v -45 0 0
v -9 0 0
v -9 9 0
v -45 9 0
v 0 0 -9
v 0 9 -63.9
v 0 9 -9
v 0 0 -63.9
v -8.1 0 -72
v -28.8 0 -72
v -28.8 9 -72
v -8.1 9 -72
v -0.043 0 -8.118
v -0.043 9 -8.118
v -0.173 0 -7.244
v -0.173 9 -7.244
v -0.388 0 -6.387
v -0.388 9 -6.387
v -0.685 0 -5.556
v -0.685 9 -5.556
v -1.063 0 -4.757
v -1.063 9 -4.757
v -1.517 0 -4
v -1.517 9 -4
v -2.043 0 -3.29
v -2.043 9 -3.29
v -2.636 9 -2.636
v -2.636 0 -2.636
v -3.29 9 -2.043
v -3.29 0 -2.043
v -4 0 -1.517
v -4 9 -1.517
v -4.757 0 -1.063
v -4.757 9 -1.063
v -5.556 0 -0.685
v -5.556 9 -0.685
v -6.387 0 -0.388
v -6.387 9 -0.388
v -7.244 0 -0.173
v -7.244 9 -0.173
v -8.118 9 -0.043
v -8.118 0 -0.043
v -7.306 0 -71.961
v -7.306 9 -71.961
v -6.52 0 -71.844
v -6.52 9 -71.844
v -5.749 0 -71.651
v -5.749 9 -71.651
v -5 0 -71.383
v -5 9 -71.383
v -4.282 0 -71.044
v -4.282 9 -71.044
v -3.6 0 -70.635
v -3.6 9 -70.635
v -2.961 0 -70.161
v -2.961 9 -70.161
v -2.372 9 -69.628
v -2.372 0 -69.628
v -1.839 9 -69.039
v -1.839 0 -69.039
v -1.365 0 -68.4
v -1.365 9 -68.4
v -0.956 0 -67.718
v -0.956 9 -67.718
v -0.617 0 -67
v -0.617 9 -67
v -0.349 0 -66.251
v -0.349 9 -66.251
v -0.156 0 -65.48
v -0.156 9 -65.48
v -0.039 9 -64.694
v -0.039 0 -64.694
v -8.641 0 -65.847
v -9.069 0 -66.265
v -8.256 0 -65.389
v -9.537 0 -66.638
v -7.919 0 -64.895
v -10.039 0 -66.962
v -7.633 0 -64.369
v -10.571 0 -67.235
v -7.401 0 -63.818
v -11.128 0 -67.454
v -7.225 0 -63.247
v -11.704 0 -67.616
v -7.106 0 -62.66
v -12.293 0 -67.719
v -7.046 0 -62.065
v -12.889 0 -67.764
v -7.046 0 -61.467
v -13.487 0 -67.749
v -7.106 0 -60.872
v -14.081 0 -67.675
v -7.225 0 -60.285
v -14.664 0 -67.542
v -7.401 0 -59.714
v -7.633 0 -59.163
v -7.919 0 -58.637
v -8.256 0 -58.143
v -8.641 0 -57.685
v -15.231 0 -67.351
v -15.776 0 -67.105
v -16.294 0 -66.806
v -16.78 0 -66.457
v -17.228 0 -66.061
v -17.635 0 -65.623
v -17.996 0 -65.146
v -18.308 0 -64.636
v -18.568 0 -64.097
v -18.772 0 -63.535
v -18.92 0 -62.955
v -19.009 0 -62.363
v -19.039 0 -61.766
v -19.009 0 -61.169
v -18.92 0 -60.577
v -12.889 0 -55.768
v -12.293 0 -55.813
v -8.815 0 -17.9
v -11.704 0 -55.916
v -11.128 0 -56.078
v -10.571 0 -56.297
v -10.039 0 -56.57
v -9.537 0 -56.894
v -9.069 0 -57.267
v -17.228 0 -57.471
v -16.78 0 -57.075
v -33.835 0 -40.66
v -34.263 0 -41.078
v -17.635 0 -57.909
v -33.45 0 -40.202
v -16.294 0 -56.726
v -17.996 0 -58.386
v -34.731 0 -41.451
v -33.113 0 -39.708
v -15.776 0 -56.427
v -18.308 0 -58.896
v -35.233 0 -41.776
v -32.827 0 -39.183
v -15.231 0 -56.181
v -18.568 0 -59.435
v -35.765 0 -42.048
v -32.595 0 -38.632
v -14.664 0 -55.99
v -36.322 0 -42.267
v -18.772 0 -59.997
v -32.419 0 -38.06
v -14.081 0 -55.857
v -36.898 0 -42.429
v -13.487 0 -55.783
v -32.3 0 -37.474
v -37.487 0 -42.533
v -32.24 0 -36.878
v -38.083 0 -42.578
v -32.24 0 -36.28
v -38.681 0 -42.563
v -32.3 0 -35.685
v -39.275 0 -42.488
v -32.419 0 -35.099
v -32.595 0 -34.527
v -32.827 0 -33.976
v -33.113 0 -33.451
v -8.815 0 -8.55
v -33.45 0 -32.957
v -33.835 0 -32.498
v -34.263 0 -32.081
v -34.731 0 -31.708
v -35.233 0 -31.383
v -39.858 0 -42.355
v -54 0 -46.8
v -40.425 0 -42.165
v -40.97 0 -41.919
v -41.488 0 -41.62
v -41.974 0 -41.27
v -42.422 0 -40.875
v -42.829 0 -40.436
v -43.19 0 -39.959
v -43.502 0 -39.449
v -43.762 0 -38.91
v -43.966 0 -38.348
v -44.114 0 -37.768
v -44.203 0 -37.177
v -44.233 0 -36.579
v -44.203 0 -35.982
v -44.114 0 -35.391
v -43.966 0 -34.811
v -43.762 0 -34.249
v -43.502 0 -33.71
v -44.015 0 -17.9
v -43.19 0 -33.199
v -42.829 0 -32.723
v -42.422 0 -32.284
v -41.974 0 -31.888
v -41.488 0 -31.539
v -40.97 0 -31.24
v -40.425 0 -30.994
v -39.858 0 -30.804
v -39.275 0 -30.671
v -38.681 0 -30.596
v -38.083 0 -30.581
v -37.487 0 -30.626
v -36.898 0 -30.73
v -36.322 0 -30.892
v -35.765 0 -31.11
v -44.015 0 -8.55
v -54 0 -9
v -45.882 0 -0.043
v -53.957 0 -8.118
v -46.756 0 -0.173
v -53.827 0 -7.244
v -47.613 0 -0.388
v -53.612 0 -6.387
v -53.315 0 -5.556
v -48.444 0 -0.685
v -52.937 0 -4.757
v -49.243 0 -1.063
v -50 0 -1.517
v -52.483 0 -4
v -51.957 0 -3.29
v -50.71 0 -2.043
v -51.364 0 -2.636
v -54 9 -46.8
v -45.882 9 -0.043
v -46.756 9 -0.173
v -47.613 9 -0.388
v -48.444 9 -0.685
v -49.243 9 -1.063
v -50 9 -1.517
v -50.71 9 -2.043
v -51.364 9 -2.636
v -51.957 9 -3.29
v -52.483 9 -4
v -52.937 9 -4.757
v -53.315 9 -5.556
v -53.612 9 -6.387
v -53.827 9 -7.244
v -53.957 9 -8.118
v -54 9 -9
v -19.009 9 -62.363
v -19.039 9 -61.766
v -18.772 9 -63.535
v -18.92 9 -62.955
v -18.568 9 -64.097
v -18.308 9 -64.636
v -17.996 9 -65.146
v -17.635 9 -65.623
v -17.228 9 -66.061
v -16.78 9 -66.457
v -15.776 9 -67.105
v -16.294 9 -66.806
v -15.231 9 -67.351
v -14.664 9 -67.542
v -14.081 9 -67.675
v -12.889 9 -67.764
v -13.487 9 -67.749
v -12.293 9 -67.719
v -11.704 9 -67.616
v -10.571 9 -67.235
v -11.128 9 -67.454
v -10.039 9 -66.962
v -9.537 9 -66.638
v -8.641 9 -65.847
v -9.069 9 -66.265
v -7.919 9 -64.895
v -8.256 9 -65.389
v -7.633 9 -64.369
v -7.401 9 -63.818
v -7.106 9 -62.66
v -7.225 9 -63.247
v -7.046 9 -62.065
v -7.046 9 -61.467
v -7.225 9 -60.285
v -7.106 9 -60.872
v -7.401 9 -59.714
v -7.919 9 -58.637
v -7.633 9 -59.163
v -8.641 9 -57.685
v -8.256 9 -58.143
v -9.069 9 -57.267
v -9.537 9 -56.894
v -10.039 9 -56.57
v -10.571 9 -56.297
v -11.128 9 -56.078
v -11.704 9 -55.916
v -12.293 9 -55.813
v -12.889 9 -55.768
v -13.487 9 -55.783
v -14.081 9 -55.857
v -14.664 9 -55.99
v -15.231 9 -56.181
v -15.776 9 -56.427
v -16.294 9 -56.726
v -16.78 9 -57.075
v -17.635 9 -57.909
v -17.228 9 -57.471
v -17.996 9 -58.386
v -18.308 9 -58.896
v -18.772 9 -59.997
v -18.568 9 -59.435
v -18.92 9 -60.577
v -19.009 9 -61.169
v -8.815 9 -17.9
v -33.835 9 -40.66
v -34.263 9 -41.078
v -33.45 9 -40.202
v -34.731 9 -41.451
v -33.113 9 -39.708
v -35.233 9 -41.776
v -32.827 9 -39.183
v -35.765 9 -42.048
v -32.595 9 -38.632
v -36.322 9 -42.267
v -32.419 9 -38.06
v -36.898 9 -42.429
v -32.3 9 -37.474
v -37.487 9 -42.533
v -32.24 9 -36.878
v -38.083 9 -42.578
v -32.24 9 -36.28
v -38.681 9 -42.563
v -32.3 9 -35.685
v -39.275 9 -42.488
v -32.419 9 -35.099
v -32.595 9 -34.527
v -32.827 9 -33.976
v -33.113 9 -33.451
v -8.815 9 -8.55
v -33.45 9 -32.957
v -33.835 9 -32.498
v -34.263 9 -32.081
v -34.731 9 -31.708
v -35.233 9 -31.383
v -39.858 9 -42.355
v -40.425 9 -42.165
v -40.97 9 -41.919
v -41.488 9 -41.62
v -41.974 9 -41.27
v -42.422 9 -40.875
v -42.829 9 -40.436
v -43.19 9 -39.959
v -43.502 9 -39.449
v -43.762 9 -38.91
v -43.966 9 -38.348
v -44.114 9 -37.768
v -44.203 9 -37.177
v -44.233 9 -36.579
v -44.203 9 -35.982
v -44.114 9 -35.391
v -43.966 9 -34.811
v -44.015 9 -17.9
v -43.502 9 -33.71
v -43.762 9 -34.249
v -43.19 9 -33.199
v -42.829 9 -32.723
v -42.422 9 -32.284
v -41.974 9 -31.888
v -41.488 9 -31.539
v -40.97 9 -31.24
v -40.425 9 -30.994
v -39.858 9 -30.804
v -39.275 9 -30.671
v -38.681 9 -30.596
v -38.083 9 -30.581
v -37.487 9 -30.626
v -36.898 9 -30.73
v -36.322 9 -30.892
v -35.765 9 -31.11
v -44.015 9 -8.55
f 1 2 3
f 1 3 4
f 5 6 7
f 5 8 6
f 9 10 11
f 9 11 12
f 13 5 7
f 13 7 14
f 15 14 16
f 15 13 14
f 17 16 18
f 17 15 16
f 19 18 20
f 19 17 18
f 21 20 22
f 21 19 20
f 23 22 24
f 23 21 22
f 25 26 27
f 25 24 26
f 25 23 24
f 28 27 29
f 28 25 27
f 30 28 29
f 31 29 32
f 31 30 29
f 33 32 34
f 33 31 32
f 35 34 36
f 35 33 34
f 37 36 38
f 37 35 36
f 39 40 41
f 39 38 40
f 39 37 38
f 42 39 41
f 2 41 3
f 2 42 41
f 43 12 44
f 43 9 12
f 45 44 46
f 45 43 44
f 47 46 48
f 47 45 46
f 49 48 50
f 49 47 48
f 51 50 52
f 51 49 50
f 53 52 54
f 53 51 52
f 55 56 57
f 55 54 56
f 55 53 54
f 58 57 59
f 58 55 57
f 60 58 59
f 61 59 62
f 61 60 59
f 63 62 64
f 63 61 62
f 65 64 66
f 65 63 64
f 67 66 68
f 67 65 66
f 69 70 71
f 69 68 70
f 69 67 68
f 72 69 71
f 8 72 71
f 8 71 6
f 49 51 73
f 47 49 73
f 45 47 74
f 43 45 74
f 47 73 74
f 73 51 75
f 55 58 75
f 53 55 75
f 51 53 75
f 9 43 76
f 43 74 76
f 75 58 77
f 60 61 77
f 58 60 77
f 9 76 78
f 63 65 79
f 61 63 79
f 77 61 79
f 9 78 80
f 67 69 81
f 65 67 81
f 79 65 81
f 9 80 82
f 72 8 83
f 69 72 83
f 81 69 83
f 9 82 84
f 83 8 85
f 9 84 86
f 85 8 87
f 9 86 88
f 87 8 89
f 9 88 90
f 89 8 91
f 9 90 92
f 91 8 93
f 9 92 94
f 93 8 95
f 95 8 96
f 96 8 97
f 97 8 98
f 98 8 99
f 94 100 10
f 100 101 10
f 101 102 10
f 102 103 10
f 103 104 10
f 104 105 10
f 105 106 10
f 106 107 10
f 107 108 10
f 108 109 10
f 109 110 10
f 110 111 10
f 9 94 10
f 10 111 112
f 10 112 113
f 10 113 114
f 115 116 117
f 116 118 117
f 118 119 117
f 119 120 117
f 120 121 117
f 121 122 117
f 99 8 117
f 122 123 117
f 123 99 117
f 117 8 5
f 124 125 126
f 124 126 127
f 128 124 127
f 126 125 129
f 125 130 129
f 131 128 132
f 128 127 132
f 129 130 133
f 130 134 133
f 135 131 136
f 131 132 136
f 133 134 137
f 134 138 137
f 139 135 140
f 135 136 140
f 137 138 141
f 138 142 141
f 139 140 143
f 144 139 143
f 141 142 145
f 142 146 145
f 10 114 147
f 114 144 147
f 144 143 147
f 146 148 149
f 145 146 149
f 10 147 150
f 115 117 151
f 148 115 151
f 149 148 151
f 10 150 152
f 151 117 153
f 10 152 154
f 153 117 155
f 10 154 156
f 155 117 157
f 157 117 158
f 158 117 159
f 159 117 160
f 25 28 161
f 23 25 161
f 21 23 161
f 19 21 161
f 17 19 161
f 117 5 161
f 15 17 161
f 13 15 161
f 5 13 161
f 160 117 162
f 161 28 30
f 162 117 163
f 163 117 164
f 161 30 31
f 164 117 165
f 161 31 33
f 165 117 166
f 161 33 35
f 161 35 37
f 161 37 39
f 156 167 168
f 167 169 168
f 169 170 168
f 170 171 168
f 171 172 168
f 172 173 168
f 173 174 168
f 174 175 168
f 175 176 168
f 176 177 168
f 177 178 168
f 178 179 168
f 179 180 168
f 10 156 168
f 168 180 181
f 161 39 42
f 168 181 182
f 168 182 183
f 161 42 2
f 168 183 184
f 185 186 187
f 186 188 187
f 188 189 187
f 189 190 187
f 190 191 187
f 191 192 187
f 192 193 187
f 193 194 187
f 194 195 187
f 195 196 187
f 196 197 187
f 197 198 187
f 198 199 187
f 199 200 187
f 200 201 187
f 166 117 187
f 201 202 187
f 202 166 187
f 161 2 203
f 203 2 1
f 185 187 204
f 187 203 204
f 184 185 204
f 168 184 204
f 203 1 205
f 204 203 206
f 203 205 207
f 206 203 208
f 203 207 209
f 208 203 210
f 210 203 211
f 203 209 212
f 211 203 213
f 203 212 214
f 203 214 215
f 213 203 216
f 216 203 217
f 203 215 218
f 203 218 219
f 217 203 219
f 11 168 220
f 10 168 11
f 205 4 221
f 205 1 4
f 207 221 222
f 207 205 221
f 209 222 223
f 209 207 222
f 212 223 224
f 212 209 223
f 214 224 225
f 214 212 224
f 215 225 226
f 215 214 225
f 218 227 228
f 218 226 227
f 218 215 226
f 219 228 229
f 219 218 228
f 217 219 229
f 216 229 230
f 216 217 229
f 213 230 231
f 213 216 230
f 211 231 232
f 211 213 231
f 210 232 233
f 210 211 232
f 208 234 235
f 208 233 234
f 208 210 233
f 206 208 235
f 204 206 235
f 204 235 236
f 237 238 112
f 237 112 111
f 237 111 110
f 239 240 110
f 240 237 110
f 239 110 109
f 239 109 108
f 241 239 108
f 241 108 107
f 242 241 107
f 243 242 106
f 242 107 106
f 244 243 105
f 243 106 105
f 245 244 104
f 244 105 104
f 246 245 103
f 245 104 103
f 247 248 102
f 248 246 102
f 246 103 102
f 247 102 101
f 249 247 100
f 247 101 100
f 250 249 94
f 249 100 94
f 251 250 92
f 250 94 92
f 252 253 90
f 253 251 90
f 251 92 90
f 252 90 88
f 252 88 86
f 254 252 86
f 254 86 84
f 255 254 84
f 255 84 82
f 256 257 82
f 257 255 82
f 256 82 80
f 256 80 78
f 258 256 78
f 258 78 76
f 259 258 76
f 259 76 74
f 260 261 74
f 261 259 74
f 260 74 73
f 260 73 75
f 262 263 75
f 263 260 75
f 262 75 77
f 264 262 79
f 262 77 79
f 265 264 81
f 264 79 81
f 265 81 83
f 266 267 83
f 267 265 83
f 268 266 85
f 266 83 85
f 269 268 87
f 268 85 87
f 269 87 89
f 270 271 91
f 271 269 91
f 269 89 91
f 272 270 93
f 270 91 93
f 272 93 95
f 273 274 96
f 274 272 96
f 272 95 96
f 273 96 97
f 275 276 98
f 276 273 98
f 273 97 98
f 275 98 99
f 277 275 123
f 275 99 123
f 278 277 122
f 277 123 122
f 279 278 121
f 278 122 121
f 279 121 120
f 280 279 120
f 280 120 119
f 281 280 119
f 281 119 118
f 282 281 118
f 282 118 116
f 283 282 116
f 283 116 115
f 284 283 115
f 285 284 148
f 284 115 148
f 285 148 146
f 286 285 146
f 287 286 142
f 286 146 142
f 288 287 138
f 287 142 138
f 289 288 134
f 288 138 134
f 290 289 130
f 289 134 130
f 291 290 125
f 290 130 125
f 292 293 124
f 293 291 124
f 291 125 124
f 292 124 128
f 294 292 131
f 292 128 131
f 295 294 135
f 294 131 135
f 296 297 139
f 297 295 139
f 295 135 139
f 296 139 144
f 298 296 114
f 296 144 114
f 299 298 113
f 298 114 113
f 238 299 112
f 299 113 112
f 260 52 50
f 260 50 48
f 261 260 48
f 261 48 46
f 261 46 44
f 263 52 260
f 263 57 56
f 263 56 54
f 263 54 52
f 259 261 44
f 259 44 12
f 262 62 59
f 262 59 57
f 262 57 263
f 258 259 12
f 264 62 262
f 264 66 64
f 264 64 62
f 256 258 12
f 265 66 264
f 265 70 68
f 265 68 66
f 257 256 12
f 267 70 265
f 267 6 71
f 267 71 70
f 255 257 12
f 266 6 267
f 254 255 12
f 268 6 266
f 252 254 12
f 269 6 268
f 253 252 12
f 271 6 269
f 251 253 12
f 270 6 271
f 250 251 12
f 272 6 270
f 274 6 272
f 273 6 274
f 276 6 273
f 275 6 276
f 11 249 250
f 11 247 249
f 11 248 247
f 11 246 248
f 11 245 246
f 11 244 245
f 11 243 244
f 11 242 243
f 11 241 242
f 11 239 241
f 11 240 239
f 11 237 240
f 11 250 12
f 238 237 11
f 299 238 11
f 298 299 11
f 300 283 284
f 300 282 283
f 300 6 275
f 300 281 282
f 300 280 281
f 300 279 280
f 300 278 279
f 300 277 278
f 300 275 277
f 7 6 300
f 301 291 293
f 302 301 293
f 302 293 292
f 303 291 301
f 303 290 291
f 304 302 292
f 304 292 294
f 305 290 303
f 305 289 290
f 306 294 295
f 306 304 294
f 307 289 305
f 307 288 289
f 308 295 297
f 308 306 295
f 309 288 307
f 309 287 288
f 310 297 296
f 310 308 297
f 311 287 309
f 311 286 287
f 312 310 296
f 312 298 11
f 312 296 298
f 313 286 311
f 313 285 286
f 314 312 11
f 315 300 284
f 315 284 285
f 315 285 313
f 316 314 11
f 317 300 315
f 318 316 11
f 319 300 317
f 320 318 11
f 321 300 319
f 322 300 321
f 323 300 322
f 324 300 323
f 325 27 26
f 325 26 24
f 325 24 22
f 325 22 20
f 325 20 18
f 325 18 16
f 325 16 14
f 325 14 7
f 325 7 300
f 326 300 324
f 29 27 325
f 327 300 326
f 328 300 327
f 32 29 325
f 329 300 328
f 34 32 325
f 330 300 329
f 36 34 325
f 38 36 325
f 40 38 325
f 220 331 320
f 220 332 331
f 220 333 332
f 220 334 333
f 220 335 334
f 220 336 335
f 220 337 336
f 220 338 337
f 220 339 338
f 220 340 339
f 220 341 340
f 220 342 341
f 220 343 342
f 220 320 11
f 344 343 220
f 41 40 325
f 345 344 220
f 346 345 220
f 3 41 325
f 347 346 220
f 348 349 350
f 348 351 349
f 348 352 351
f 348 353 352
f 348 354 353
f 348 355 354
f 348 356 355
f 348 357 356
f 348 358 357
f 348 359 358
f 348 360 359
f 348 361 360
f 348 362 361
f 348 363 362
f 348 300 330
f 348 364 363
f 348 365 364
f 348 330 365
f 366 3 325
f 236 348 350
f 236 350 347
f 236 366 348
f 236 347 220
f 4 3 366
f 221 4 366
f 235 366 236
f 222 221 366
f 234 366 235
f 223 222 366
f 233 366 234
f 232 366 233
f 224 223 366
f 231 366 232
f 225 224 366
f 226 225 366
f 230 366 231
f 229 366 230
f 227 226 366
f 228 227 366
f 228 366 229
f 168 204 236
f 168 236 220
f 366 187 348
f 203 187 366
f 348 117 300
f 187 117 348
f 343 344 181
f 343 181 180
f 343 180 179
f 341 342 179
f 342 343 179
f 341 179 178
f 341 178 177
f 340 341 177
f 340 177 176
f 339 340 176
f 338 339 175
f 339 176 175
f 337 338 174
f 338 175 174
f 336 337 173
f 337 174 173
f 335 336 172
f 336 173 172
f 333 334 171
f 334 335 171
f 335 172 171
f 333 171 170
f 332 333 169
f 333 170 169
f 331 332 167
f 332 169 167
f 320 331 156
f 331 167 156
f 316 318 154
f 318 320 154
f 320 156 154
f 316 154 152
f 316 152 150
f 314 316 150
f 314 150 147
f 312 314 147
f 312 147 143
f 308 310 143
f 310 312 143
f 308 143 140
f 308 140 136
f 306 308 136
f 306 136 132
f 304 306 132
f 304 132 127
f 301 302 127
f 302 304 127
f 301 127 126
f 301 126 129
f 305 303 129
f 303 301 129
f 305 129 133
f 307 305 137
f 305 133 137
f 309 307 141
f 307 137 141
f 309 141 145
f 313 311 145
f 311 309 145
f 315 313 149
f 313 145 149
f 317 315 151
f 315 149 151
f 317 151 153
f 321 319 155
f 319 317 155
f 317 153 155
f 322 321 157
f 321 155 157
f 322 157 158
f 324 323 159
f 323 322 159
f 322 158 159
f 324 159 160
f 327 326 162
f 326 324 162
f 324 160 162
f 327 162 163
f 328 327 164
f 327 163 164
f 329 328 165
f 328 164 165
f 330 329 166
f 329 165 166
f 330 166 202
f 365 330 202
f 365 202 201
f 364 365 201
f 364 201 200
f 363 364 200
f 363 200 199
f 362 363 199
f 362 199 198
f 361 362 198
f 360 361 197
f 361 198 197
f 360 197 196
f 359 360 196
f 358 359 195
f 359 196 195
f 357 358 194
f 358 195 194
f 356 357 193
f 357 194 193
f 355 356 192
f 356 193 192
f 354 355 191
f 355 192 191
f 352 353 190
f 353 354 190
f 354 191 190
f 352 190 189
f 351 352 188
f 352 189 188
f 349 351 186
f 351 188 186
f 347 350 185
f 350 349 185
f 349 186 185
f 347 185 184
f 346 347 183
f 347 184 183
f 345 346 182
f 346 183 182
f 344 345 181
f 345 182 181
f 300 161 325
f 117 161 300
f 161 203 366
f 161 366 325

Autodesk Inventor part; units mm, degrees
ref_plane "YZ Plane" through (0, 0, 0) normal (1, 0, 0) x (0, 1, 0)
ref_plane "XZ Plane" through (0, 0, 0) normal (0, 1, 0) x (-1, 0, 0)
ref_plane "XY Plane" through (0, 0, 0) normal (0, 0, 1) x (1, 0, 0)
sketch "Sketch1" plane through (0, 0, 0) normal (0, 1, 0) x (-1, 0, 0)
  line L0 (9, 0) -> (45, 0)
  line L1 (54, -9) -> (54, -46.8)
  line L2 (28.8, -72) -> (8.1, -72)
  line L3 (0, -63.9) -> (0, -9)
  arc A0 (54, -9) -> (45, 0) centre (45, -9) ccw
  arc A1 (9, 0) -> (0, -9) centre (9, -9) ccw
  arc A2 (0, -63.9) -> (8.1, -72) centre (8.1, -63.9) ccw
  line L4 (54, -46.8) -> (28.8, -72)
  circle A3 centre (38.233, -36.5794) radius 6
  circle A4 centre (13.039, -61.766) radius 6
  line L5 (44.015, -8.55) -> (8.815, -8.55)
  line L6 (8.815, -8.55) -> (8.815, -17.9)
  line L7 (8.815, -17.9) -> (44.015, -17.9)
  line L8 (44.015, -17.9) -> (44.015, -8.55)
  point P0 (0, 0)
  point P1 (54, -72)
  point P2 (54, 0)
  point P3 (0, -72)
  dimension "d2" = 9
  dimension "d3" = 8.1
  dimension "d7" = 20.7
  dimension "d8" = 36
  dimension "d9" = 37.8
  dimension "d10" = 9
  dimension "d11" = 54.9
  dimension "d12" = 12
  dimension "d13" = 12
  dimension "d14" = 15.767
  dimension "d15" = 18.376
  dimension "d16" = 10.234
  dimension "d17" = 13.039
  dimension "d18" = 38.233
  dimension "d19" = 9.35
  dimension "d20" = 35.2
  dimension "d21" = 8.55
  dimension "d22" = 8.815
  dimension "d23" = 9.985
  dimension "d26" = 23.6245
extrude "Extrusion1" add sketch "Sketch1" along normal blind 9
properties part number "Hip"
